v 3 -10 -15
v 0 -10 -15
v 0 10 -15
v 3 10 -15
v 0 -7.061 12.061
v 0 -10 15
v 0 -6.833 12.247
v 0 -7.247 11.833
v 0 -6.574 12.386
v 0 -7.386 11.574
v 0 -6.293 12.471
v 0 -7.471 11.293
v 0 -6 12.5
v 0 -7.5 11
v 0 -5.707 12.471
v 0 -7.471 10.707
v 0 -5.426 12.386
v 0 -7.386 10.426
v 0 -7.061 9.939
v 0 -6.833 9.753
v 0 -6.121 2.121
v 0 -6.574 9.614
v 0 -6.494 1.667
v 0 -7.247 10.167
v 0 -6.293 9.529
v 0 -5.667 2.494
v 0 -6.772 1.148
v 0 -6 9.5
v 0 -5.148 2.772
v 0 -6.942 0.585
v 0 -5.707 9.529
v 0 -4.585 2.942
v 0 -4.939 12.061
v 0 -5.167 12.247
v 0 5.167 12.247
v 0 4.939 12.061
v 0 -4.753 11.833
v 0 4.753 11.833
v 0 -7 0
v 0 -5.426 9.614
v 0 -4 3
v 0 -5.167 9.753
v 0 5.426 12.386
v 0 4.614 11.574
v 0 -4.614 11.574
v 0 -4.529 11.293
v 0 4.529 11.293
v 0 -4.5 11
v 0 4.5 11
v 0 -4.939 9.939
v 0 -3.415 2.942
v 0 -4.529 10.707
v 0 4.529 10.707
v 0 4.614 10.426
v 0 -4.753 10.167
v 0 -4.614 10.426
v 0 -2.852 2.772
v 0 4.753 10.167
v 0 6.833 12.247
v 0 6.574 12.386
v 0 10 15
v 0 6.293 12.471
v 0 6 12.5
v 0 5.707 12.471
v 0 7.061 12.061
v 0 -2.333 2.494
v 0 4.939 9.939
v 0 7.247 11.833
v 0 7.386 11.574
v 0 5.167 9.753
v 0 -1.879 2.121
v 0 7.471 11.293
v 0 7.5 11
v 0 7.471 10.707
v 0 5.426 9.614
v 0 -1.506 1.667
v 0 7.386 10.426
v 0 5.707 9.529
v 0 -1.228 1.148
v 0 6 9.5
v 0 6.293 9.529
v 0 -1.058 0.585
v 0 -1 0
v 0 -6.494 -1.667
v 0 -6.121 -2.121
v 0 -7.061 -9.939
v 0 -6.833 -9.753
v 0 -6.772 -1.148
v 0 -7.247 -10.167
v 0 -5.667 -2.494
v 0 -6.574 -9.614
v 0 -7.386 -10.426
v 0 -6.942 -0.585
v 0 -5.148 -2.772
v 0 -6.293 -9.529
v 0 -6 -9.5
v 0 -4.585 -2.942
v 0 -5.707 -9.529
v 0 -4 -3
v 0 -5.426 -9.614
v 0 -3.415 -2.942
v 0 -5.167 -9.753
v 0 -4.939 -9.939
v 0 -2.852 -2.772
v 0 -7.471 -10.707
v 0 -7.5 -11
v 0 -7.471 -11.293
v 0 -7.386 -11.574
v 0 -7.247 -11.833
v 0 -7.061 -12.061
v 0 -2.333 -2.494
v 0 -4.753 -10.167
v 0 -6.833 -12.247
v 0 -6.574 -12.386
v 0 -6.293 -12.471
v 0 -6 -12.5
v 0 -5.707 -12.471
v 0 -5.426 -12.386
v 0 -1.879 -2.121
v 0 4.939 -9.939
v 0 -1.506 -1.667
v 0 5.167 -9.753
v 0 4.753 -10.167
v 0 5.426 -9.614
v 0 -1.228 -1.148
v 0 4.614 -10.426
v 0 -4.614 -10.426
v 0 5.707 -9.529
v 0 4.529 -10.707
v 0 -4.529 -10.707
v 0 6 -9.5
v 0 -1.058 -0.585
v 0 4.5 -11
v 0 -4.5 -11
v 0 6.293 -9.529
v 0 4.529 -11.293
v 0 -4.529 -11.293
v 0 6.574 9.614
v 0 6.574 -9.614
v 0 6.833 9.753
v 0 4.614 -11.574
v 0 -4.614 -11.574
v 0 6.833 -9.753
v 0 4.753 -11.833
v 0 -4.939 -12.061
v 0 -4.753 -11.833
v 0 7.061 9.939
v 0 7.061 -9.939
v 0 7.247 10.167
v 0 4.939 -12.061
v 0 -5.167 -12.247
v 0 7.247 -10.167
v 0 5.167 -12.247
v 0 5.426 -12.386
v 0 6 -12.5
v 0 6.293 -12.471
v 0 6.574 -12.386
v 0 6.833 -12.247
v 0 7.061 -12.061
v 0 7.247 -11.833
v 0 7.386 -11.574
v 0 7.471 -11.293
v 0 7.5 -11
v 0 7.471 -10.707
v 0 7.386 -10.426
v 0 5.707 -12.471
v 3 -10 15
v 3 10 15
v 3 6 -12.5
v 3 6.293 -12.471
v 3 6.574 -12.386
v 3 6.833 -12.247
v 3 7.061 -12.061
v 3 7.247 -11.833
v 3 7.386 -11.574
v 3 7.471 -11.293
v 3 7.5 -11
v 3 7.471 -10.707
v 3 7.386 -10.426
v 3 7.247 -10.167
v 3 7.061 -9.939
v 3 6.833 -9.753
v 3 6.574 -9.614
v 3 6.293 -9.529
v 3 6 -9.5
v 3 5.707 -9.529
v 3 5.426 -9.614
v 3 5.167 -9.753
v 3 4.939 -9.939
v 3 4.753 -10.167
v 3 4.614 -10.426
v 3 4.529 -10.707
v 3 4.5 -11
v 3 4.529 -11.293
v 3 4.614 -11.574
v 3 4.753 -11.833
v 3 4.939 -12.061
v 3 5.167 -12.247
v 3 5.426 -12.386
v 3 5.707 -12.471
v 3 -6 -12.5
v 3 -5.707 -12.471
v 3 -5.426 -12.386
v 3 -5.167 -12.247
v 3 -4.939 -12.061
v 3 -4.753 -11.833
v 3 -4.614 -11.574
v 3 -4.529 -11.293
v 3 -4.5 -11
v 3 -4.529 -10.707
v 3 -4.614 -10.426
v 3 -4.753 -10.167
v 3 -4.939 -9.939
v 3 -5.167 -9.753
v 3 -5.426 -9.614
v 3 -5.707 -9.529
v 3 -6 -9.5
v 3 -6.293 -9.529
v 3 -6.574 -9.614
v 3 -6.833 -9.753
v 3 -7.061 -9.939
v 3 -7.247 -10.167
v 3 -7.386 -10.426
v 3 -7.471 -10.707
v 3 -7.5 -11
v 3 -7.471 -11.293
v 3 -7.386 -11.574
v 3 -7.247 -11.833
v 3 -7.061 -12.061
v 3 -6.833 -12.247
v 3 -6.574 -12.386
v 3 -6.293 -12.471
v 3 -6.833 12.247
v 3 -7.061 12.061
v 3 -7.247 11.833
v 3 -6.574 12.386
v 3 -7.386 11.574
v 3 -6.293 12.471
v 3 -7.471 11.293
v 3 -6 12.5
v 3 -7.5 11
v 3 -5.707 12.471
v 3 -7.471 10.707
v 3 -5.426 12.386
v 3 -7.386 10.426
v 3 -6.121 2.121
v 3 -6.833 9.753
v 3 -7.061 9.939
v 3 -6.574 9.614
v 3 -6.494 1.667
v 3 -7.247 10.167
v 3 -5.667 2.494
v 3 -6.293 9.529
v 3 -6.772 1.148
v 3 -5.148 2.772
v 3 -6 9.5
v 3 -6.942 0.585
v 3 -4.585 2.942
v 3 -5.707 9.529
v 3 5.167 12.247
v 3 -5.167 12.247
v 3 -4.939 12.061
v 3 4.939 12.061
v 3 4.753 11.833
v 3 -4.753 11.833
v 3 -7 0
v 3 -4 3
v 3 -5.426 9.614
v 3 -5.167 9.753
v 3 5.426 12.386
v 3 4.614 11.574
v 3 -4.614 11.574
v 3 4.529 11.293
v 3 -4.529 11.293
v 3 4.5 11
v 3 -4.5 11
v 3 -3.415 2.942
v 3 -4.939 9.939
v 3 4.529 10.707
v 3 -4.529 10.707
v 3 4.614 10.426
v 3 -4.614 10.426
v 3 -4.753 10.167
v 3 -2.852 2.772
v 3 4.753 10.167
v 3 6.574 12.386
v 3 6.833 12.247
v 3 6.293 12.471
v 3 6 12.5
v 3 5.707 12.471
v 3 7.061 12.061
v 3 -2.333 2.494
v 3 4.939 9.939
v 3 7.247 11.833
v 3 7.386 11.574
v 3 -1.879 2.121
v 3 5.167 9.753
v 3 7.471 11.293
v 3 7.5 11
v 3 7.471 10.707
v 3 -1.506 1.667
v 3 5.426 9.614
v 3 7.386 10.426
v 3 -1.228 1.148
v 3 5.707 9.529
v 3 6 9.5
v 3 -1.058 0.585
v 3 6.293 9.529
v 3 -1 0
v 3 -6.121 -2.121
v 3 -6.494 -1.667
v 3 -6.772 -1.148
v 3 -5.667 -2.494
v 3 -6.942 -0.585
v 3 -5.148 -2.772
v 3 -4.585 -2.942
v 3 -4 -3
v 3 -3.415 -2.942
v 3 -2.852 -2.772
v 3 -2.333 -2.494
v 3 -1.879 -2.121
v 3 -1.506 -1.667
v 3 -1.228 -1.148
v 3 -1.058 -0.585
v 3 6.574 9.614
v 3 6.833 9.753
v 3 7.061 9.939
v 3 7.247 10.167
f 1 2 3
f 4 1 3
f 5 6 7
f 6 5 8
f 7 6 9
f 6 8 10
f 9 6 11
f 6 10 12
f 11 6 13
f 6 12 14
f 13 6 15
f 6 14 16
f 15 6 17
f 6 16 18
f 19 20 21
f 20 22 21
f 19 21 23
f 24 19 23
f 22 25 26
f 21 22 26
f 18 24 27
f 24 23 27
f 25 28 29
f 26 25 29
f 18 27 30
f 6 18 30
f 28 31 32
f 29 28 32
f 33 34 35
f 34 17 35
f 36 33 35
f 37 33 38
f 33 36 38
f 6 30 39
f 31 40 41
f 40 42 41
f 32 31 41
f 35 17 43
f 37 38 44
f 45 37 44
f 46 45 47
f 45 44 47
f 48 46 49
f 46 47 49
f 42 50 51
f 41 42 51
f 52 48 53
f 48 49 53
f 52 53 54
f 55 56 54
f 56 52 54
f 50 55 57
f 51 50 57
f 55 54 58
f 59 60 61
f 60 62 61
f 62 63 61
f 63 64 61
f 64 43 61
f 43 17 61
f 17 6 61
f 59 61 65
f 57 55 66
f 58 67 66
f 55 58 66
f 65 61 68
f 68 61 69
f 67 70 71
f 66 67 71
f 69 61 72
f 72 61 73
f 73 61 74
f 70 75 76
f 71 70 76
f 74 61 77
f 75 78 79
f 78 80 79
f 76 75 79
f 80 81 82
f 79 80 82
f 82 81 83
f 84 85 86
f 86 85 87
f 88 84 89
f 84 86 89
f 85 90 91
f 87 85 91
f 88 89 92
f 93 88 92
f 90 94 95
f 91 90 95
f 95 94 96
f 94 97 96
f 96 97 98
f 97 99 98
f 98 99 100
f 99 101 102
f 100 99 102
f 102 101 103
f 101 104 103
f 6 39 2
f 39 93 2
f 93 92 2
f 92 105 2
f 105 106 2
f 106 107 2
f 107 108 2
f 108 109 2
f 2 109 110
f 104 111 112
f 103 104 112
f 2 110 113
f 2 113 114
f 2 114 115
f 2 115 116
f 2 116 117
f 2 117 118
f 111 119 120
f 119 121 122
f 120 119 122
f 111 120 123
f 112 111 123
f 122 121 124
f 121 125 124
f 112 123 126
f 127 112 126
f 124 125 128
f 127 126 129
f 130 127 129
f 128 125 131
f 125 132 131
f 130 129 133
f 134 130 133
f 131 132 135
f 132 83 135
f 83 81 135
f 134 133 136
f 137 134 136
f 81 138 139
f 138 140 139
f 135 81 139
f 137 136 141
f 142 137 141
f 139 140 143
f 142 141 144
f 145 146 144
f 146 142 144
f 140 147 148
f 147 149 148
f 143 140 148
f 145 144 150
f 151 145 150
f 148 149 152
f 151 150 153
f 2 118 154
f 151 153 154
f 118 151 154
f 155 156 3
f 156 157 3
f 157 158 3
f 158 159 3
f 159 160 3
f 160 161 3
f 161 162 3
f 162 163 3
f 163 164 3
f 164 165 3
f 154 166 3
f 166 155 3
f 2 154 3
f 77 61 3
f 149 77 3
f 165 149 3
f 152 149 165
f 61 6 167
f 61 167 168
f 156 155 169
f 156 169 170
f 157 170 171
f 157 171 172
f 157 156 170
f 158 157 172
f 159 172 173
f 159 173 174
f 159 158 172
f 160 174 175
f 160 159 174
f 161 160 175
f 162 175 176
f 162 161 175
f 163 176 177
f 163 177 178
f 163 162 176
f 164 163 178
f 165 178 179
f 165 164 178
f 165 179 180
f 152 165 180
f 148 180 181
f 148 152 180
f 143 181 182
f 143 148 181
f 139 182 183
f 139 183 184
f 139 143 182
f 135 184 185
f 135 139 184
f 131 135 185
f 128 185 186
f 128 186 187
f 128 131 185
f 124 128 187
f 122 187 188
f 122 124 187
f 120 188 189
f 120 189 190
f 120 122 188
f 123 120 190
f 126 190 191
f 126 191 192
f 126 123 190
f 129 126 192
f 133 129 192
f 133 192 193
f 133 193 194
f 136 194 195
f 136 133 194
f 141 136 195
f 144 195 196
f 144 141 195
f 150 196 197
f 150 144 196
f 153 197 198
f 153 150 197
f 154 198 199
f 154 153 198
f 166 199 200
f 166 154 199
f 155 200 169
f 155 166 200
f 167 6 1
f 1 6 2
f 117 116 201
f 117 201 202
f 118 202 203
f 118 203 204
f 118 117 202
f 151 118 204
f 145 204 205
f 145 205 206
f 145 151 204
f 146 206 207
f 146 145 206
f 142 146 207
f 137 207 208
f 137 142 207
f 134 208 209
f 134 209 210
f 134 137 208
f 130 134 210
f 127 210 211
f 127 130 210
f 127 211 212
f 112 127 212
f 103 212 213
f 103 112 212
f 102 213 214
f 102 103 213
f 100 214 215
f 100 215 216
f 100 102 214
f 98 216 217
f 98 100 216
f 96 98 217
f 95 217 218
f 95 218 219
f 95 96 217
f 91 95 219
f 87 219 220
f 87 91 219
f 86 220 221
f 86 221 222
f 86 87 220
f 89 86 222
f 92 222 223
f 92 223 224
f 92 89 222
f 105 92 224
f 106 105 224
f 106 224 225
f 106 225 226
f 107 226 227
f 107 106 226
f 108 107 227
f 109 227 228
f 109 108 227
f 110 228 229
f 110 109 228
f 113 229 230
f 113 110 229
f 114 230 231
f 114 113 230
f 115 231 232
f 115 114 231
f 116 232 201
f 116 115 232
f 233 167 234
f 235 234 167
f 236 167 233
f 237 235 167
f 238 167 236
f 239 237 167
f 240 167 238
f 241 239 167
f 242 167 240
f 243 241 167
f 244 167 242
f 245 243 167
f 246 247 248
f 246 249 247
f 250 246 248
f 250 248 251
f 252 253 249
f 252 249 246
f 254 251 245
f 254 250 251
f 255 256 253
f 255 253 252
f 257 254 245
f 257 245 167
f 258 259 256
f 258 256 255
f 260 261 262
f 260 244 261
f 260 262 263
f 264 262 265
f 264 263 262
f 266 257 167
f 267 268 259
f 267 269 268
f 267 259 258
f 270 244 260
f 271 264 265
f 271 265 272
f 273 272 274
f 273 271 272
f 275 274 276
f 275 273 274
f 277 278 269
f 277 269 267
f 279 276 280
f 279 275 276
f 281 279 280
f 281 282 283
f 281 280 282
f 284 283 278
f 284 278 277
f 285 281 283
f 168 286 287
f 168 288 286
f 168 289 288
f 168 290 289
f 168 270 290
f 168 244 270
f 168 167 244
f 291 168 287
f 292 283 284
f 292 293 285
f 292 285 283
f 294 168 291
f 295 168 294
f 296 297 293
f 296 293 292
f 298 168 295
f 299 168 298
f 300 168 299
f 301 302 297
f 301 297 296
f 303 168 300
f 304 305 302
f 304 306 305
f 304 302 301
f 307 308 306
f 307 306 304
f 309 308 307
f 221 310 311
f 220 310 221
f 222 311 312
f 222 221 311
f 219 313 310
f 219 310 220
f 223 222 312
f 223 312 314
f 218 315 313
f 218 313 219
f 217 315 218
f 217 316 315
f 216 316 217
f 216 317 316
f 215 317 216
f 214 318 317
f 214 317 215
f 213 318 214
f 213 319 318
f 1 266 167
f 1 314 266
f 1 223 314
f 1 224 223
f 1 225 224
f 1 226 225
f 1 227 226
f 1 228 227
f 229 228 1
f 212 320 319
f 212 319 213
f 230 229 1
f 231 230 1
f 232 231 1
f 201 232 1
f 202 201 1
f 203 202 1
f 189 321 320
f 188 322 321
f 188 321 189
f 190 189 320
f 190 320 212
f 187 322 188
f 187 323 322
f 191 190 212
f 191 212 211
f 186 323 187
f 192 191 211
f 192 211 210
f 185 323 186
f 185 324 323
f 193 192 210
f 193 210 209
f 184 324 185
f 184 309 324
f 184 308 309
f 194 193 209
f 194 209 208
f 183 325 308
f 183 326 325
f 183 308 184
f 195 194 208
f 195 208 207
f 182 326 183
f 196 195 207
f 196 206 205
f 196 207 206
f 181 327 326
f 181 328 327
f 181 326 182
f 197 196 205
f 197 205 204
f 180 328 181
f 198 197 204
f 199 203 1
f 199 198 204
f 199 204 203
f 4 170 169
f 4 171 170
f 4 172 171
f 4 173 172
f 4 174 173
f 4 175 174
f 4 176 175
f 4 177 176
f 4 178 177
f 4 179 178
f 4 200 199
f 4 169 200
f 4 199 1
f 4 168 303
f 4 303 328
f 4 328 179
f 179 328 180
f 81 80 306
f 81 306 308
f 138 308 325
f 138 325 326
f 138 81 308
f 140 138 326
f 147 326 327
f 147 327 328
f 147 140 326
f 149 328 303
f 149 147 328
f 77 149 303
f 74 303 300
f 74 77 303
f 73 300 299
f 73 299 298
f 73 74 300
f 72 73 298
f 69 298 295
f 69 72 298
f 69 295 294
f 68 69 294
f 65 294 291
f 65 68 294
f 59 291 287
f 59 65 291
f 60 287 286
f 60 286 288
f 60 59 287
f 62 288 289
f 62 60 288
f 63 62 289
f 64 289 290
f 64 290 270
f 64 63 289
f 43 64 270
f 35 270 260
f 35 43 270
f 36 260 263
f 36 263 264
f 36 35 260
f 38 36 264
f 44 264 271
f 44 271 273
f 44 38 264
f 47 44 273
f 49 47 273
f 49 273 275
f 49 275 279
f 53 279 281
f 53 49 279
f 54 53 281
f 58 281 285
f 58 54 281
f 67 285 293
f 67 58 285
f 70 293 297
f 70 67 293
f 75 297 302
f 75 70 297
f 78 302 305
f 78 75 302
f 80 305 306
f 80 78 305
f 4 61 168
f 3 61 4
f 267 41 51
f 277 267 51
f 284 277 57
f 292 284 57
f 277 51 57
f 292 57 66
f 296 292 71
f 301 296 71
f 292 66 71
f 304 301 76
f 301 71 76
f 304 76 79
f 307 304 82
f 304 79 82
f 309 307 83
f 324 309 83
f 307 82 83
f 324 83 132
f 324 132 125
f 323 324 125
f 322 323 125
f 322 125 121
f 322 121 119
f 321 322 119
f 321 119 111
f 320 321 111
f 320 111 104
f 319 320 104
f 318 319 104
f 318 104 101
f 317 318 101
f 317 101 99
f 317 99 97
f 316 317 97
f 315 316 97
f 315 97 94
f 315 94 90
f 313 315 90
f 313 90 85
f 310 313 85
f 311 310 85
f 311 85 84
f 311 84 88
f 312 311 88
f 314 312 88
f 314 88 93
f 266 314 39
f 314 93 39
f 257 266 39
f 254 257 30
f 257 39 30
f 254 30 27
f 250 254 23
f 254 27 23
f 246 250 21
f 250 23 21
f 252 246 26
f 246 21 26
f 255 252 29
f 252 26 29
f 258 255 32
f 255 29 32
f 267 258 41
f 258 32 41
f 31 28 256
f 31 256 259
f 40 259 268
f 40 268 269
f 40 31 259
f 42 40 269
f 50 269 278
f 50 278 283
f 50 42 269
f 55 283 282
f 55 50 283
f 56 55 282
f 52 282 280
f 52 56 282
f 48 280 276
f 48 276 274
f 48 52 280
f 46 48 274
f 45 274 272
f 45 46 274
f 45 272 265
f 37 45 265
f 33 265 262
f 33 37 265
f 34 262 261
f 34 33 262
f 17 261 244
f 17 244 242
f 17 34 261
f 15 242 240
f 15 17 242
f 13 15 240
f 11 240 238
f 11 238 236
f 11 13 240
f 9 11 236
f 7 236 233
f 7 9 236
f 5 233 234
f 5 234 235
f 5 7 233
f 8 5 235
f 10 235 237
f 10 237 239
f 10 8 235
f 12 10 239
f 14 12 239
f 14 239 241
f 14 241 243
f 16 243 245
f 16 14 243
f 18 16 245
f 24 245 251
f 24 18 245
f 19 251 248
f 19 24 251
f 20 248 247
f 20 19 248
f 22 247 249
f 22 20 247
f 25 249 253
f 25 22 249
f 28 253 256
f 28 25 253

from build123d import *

# Parameters (mm, degrees)
SKETCH_1_W          = 30
SKETCH_1_H          = 20
SKETCH_1_R          = 1.5
EXTRUDE_1_DEPTH     = 3
CUT_EXTRUDE_1_REACH = 5
SKETCH_2_R          = 3


with BuildPart() as part:
    # 草图1 → 凸台-拉伸1 (new body)
    with BuildSketch(Plane(origin=(0, 0, 0), x_dir=(0, 0, -1), z_dir=(1, 0, 0))):
        Rectangle(SKETCH_1_W, SKETCH_1_H)
        with Locations((-11, 6)):
            Circle(SKETCH_1_R, mode=Mode.SUBTRACT)
        with Locations((-11, -6)):
            Circle(SKETCH_1_R, mode=Mode.SUBTRACT)
        with Locations((11, -6)):
            Circle(SKETCH_1_R, mode=Mode.SUBTRACT)
        with Locations((11, 6)):
            Circle(SKETCH_1_R, mode=Mode.SUBTRACT)
    extrude(amount=EXTRUDE_1_DEPTH)

    # 草图2 → 切除-拉伸1 (cut, up to next)
    with BuildSketch(Plane.ZY, mode=Mode.PRIVATE) as cut_extrude_1_sk1:
        with Locations((0, -4)):
            Circle(SKETCH_2_R)
    cut_extrude_1_tool1 = extrude(cut_extrude_1_sk1.sketch, amount=-CUT_EXTRUDE_1_REACH, mode=Mode.PRIVATE) & part.part
    add(cut_extrude_1_tool1.solids().sort_by_distance((0, -4, 0))[0], mode=Mode.SUBTRACT)


solid = part.part
